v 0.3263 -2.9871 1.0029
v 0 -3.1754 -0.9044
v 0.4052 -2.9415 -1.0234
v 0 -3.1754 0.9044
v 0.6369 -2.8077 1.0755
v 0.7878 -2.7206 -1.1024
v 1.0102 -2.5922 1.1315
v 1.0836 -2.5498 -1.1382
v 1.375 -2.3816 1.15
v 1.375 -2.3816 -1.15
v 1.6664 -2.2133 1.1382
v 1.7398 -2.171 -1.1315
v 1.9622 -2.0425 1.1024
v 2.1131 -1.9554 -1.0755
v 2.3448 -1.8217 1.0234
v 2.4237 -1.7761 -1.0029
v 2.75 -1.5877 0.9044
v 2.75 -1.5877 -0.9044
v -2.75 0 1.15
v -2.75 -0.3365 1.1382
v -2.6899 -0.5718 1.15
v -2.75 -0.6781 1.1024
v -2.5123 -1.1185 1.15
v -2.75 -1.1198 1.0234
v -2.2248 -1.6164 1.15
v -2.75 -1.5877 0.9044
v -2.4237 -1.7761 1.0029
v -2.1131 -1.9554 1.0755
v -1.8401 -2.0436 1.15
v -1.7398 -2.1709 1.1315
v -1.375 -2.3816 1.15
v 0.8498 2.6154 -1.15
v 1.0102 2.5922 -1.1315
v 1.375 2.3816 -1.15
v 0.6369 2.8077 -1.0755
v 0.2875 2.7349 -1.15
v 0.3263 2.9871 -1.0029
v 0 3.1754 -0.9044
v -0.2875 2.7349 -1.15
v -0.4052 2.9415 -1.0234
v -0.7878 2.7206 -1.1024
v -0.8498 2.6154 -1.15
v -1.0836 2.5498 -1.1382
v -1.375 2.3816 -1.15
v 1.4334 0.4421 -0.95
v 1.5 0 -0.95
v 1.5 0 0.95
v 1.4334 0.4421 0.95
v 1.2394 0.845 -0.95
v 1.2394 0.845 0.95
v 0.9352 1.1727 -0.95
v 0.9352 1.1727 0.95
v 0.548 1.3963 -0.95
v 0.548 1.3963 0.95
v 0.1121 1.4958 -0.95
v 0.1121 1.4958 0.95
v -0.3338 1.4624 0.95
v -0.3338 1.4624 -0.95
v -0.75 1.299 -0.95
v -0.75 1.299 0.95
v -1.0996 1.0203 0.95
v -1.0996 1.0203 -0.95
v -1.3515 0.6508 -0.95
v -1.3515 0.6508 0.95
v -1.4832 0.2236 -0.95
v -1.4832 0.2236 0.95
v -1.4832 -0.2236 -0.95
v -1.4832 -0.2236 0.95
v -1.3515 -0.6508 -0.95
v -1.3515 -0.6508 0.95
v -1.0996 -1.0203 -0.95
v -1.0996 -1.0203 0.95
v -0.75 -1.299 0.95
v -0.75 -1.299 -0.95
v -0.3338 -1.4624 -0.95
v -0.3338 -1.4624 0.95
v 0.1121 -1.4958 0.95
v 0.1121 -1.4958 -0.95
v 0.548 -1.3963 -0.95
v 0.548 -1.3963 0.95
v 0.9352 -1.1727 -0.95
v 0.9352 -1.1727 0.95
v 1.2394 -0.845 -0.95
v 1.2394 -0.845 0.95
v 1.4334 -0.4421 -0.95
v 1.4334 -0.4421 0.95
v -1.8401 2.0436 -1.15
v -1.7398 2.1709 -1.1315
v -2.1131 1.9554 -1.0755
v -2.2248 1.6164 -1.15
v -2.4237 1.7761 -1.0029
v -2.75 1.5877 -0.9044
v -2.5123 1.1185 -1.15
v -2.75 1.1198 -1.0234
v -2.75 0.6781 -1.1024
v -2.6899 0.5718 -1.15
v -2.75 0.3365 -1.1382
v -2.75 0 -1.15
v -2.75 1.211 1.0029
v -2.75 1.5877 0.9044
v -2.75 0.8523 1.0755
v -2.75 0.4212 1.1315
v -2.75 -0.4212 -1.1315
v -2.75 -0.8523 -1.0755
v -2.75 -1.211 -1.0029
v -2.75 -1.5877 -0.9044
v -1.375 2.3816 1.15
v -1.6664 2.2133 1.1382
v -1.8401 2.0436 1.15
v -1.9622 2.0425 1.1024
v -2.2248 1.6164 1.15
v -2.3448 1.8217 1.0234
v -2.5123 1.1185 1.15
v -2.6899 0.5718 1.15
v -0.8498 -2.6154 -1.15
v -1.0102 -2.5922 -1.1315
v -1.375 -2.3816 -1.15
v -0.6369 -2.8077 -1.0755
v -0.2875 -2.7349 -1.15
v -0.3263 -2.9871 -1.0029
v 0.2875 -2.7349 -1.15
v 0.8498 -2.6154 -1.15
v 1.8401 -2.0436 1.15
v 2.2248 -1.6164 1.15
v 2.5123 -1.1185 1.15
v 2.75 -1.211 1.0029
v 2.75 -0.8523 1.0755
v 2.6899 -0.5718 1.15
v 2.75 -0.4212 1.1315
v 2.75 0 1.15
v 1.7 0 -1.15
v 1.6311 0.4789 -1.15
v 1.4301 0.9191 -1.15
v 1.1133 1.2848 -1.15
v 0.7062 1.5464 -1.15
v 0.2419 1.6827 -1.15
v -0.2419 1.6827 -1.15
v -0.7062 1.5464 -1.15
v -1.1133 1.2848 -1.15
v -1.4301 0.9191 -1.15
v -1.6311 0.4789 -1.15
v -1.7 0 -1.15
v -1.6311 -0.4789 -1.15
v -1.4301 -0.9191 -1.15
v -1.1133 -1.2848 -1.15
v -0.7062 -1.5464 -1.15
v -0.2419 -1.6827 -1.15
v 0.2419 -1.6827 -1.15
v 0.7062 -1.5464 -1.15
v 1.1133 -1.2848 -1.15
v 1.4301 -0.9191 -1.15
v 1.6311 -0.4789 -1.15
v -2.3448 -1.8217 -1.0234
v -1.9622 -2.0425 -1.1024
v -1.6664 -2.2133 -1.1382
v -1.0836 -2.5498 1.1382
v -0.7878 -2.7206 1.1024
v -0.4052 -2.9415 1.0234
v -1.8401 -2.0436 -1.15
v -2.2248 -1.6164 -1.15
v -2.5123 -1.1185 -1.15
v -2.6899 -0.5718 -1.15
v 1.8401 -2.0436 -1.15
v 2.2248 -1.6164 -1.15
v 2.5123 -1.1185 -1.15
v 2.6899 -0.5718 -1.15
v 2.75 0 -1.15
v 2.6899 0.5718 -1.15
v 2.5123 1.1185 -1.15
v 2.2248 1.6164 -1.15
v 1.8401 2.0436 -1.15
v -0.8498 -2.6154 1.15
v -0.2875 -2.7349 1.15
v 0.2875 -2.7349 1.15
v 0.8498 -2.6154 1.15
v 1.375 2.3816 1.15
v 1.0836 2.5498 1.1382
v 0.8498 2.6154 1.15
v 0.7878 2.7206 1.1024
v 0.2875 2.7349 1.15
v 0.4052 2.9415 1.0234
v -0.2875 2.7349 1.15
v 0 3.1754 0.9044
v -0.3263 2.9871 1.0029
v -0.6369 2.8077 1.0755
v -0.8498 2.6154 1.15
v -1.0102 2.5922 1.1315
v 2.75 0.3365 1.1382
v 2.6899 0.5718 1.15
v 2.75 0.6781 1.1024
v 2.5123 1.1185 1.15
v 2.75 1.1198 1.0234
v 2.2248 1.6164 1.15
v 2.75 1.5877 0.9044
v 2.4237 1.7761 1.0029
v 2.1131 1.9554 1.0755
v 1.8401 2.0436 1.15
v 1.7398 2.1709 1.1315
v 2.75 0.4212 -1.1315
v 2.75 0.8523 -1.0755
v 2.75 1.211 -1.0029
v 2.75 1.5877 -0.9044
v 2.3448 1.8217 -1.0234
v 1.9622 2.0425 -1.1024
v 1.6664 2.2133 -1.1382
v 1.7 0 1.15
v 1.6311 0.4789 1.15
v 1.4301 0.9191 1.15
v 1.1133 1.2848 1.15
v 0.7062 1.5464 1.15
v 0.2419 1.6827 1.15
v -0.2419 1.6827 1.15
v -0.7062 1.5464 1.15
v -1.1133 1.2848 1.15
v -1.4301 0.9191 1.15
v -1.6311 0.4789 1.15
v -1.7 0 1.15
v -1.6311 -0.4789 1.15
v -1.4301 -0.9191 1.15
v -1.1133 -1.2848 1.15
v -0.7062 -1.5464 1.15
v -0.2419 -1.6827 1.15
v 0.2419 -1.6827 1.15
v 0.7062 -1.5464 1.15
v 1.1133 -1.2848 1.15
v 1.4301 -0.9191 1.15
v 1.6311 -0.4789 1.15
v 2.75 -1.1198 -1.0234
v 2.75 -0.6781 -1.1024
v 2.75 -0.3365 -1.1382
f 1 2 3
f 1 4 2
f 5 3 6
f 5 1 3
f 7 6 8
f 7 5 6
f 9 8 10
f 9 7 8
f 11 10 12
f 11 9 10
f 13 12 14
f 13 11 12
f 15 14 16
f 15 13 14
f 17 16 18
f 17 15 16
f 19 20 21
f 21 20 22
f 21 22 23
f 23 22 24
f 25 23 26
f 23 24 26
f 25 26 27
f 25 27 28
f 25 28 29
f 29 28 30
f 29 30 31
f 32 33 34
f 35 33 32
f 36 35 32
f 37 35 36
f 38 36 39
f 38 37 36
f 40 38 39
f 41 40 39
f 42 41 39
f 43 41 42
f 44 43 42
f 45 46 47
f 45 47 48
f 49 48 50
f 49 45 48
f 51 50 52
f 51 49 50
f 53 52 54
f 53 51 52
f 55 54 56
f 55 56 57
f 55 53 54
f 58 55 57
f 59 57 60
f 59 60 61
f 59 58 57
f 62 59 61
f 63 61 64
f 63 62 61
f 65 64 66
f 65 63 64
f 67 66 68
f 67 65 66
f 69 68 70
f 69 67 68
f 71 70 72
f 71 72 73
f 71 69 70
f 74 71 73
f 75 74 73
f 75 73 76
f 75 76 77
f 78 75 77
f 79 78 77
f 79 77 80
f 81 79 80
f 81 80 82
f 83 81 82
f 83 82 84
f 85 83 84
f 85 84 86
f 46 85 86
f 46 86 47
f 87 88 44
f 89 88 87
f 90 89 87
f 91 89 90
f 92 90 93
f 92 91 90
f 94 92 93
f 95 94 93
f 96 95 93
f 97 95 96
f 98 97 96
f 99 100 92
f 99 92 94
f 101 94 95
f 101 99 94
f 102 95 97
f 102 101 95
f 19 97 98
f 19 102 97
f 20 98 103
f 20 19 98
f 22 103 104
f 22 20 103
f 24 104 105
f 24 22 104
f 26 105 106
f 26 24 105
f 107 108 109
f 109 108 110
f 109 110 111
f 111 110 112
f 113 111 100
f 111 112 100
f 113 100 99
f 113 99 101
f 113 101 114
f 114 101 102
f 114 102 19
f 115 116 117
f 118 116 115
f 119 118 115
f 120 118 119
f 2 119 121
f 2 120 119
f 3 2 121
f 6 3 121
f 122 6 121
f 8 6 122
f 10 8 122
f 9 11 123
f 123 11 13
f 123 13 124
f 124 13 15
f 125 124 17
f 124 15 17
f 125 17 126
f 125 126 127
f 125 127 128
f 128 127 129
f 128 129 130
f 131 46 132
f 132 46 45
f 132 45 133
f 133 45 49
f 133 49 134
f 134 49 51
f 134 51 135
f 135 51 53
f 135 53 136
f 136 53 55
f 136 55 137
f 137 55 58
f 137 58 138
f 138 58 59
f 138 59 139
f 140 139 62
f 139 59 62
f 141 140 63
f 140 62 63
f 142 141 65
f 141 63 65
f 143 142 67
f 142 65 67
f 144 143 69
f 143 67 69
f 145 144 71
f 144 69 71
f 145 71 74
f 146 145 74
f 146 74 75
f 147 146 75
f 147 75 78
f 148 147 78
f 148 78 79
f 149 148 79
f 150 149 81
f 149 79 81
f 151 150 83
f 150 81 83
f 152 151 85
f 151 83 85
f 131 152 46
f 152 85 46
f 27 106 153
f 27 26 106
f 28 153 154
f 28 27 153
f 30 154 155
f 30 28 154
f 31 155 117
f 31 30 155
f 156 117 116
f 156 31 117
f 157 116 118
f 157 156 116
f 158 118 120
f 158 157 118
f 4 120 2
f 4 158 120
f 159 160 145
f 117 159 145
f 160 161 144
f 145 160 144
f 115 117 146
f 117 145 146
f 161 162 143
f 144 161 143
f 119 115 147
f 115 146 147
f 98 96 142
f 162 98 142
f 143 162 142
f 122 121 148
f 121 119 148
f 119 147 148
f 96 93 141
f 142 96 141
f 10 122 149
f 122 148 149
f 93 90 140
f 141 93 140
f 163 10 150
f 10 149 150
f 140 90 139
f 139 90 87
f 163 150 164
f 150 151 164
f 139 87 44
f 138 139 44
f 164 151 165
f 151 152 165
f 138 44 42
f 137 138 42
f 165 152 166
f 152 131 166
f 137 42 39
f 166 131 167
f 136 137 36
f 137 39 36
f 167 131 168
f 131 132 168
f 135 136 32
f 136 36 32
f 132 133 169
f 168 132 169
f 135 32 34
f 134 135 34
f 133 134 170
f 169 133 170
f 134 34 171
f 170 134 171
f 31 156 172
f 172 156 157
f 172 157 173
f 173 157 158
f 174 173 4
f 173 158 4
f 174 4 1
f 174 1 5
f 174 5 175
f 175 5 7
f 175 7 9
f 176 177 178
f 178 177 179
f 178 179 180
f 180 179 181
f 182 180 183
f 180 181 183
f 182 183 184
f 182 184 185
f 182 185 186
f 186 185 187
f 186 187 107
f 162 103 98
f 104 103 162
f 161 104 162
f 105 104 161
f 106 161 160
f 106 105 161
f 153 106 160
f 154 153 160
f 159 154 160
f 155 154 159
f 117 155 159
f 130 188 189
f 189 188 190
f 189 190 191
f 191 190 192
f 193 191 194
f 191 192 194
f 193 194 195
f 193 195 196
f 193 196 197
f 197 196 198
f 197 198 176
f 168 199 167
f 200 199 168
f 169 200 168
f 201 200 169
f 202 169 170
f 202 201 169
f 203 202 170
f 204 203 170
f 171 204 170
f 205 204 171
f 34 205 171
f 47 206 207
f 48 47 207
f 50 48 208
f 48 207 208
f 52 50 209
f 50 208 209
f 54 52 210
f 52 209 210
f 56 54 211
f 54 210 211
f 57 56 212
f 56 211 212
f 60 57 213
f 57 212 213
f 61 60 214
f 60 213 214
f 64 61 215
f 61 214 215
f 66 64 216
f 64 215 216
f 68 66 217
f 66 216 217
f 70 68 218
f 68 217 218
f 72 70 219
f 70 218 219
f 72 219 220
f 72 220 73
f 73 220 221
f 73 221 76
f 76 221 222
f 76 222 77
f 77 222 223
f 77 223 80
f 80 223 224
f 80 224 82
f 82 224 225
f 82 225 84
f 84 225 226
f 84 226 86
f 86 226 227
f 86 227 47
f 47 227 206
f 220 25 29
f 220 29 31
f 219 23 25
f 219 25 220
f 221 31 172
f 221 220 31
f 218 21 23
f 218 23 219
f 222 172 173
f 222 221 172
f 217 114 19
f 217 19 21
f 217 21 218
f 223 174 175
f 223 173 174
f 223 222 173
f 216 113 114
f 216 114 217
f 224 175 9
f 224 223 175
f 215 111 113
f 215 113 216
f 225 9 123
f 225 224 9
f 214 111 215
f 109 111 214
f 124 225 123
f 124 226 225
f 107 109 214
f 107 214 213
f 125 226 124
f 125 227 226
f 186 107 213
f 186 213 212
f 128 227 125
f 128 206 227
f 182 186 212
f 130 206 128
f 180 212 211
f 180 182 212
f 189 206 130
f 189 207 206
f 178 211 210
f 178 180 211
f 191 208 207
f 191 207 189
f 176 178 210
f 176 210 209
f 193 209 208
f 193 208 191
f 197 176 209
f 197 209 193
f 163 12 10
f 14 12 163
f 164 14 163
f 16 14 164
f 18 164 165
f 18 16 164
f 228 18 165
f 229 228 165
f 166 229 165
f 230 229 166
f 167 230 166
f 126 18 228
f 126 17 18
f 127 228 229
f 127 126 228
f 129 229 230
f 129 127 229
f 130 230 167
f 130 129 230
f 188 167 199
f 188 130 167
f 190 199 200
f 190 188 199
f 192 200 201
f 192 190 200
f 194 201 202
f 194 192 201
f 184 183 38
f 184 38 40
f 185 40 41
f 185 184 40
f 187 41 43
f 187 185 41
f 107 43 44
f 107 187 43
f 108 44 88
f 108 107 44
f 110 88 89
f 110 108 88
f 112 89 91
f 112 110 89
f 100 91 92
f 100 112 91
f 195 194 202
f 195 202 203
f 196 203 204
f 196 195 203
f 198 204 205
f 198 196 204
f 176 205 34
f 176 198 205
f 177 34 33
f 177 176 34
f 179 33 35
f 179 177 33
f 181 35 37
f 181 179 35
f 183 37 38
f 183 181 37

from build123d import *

# Parameters (mm, degrees)
SKETCH003_R  = 1.5
PAD001_DEPTH = 1.15
CHAMFER_SIZE = 0.2


with BuildPart() as part:
    # Sketch003 → Pad001 (new body, symmetric)
    with BuildSketch(Plane.XY):
        Polygon((2.75, -1.5877132403), (2.75, 1.5877132403), (0, 3.1754264805), (-2.75, 1.5877132403), (-2.75, -1.5877132403), (0, -3.1754264805), align=None)
        Circle(SKETCH003_R, mode=Mode.SUBTRACT)
    extrude(amount=PAD001_DEPTH, both=True)

    # Sketch004 → Groove (revolve, cut)
    with BuildSketch(Plane.YZ):
        Polygon((-2.75, 1.15), (-3.5, 0.7169872981), (-3.5, 1.15), align=None)
        Polygon((-2.75, -1.15), (-3.5, -0.7169872981), (-3.5, -1.15), align=None)
    revolve(axis=Axis((0, 0, 0), (0, 0, 1)), mode=Mode.SUBTRACT)

    # Chamfer
    chamfer_edges = [part.edges().sort_by_distance(p)[0] for p in [
        (-1.5, 0, 1.15),
        (-1.5, 0, -1.15),
    ]]
    chamfer(chamfer_edges, length=CHAMFER_SIZE)


solid = part.part
